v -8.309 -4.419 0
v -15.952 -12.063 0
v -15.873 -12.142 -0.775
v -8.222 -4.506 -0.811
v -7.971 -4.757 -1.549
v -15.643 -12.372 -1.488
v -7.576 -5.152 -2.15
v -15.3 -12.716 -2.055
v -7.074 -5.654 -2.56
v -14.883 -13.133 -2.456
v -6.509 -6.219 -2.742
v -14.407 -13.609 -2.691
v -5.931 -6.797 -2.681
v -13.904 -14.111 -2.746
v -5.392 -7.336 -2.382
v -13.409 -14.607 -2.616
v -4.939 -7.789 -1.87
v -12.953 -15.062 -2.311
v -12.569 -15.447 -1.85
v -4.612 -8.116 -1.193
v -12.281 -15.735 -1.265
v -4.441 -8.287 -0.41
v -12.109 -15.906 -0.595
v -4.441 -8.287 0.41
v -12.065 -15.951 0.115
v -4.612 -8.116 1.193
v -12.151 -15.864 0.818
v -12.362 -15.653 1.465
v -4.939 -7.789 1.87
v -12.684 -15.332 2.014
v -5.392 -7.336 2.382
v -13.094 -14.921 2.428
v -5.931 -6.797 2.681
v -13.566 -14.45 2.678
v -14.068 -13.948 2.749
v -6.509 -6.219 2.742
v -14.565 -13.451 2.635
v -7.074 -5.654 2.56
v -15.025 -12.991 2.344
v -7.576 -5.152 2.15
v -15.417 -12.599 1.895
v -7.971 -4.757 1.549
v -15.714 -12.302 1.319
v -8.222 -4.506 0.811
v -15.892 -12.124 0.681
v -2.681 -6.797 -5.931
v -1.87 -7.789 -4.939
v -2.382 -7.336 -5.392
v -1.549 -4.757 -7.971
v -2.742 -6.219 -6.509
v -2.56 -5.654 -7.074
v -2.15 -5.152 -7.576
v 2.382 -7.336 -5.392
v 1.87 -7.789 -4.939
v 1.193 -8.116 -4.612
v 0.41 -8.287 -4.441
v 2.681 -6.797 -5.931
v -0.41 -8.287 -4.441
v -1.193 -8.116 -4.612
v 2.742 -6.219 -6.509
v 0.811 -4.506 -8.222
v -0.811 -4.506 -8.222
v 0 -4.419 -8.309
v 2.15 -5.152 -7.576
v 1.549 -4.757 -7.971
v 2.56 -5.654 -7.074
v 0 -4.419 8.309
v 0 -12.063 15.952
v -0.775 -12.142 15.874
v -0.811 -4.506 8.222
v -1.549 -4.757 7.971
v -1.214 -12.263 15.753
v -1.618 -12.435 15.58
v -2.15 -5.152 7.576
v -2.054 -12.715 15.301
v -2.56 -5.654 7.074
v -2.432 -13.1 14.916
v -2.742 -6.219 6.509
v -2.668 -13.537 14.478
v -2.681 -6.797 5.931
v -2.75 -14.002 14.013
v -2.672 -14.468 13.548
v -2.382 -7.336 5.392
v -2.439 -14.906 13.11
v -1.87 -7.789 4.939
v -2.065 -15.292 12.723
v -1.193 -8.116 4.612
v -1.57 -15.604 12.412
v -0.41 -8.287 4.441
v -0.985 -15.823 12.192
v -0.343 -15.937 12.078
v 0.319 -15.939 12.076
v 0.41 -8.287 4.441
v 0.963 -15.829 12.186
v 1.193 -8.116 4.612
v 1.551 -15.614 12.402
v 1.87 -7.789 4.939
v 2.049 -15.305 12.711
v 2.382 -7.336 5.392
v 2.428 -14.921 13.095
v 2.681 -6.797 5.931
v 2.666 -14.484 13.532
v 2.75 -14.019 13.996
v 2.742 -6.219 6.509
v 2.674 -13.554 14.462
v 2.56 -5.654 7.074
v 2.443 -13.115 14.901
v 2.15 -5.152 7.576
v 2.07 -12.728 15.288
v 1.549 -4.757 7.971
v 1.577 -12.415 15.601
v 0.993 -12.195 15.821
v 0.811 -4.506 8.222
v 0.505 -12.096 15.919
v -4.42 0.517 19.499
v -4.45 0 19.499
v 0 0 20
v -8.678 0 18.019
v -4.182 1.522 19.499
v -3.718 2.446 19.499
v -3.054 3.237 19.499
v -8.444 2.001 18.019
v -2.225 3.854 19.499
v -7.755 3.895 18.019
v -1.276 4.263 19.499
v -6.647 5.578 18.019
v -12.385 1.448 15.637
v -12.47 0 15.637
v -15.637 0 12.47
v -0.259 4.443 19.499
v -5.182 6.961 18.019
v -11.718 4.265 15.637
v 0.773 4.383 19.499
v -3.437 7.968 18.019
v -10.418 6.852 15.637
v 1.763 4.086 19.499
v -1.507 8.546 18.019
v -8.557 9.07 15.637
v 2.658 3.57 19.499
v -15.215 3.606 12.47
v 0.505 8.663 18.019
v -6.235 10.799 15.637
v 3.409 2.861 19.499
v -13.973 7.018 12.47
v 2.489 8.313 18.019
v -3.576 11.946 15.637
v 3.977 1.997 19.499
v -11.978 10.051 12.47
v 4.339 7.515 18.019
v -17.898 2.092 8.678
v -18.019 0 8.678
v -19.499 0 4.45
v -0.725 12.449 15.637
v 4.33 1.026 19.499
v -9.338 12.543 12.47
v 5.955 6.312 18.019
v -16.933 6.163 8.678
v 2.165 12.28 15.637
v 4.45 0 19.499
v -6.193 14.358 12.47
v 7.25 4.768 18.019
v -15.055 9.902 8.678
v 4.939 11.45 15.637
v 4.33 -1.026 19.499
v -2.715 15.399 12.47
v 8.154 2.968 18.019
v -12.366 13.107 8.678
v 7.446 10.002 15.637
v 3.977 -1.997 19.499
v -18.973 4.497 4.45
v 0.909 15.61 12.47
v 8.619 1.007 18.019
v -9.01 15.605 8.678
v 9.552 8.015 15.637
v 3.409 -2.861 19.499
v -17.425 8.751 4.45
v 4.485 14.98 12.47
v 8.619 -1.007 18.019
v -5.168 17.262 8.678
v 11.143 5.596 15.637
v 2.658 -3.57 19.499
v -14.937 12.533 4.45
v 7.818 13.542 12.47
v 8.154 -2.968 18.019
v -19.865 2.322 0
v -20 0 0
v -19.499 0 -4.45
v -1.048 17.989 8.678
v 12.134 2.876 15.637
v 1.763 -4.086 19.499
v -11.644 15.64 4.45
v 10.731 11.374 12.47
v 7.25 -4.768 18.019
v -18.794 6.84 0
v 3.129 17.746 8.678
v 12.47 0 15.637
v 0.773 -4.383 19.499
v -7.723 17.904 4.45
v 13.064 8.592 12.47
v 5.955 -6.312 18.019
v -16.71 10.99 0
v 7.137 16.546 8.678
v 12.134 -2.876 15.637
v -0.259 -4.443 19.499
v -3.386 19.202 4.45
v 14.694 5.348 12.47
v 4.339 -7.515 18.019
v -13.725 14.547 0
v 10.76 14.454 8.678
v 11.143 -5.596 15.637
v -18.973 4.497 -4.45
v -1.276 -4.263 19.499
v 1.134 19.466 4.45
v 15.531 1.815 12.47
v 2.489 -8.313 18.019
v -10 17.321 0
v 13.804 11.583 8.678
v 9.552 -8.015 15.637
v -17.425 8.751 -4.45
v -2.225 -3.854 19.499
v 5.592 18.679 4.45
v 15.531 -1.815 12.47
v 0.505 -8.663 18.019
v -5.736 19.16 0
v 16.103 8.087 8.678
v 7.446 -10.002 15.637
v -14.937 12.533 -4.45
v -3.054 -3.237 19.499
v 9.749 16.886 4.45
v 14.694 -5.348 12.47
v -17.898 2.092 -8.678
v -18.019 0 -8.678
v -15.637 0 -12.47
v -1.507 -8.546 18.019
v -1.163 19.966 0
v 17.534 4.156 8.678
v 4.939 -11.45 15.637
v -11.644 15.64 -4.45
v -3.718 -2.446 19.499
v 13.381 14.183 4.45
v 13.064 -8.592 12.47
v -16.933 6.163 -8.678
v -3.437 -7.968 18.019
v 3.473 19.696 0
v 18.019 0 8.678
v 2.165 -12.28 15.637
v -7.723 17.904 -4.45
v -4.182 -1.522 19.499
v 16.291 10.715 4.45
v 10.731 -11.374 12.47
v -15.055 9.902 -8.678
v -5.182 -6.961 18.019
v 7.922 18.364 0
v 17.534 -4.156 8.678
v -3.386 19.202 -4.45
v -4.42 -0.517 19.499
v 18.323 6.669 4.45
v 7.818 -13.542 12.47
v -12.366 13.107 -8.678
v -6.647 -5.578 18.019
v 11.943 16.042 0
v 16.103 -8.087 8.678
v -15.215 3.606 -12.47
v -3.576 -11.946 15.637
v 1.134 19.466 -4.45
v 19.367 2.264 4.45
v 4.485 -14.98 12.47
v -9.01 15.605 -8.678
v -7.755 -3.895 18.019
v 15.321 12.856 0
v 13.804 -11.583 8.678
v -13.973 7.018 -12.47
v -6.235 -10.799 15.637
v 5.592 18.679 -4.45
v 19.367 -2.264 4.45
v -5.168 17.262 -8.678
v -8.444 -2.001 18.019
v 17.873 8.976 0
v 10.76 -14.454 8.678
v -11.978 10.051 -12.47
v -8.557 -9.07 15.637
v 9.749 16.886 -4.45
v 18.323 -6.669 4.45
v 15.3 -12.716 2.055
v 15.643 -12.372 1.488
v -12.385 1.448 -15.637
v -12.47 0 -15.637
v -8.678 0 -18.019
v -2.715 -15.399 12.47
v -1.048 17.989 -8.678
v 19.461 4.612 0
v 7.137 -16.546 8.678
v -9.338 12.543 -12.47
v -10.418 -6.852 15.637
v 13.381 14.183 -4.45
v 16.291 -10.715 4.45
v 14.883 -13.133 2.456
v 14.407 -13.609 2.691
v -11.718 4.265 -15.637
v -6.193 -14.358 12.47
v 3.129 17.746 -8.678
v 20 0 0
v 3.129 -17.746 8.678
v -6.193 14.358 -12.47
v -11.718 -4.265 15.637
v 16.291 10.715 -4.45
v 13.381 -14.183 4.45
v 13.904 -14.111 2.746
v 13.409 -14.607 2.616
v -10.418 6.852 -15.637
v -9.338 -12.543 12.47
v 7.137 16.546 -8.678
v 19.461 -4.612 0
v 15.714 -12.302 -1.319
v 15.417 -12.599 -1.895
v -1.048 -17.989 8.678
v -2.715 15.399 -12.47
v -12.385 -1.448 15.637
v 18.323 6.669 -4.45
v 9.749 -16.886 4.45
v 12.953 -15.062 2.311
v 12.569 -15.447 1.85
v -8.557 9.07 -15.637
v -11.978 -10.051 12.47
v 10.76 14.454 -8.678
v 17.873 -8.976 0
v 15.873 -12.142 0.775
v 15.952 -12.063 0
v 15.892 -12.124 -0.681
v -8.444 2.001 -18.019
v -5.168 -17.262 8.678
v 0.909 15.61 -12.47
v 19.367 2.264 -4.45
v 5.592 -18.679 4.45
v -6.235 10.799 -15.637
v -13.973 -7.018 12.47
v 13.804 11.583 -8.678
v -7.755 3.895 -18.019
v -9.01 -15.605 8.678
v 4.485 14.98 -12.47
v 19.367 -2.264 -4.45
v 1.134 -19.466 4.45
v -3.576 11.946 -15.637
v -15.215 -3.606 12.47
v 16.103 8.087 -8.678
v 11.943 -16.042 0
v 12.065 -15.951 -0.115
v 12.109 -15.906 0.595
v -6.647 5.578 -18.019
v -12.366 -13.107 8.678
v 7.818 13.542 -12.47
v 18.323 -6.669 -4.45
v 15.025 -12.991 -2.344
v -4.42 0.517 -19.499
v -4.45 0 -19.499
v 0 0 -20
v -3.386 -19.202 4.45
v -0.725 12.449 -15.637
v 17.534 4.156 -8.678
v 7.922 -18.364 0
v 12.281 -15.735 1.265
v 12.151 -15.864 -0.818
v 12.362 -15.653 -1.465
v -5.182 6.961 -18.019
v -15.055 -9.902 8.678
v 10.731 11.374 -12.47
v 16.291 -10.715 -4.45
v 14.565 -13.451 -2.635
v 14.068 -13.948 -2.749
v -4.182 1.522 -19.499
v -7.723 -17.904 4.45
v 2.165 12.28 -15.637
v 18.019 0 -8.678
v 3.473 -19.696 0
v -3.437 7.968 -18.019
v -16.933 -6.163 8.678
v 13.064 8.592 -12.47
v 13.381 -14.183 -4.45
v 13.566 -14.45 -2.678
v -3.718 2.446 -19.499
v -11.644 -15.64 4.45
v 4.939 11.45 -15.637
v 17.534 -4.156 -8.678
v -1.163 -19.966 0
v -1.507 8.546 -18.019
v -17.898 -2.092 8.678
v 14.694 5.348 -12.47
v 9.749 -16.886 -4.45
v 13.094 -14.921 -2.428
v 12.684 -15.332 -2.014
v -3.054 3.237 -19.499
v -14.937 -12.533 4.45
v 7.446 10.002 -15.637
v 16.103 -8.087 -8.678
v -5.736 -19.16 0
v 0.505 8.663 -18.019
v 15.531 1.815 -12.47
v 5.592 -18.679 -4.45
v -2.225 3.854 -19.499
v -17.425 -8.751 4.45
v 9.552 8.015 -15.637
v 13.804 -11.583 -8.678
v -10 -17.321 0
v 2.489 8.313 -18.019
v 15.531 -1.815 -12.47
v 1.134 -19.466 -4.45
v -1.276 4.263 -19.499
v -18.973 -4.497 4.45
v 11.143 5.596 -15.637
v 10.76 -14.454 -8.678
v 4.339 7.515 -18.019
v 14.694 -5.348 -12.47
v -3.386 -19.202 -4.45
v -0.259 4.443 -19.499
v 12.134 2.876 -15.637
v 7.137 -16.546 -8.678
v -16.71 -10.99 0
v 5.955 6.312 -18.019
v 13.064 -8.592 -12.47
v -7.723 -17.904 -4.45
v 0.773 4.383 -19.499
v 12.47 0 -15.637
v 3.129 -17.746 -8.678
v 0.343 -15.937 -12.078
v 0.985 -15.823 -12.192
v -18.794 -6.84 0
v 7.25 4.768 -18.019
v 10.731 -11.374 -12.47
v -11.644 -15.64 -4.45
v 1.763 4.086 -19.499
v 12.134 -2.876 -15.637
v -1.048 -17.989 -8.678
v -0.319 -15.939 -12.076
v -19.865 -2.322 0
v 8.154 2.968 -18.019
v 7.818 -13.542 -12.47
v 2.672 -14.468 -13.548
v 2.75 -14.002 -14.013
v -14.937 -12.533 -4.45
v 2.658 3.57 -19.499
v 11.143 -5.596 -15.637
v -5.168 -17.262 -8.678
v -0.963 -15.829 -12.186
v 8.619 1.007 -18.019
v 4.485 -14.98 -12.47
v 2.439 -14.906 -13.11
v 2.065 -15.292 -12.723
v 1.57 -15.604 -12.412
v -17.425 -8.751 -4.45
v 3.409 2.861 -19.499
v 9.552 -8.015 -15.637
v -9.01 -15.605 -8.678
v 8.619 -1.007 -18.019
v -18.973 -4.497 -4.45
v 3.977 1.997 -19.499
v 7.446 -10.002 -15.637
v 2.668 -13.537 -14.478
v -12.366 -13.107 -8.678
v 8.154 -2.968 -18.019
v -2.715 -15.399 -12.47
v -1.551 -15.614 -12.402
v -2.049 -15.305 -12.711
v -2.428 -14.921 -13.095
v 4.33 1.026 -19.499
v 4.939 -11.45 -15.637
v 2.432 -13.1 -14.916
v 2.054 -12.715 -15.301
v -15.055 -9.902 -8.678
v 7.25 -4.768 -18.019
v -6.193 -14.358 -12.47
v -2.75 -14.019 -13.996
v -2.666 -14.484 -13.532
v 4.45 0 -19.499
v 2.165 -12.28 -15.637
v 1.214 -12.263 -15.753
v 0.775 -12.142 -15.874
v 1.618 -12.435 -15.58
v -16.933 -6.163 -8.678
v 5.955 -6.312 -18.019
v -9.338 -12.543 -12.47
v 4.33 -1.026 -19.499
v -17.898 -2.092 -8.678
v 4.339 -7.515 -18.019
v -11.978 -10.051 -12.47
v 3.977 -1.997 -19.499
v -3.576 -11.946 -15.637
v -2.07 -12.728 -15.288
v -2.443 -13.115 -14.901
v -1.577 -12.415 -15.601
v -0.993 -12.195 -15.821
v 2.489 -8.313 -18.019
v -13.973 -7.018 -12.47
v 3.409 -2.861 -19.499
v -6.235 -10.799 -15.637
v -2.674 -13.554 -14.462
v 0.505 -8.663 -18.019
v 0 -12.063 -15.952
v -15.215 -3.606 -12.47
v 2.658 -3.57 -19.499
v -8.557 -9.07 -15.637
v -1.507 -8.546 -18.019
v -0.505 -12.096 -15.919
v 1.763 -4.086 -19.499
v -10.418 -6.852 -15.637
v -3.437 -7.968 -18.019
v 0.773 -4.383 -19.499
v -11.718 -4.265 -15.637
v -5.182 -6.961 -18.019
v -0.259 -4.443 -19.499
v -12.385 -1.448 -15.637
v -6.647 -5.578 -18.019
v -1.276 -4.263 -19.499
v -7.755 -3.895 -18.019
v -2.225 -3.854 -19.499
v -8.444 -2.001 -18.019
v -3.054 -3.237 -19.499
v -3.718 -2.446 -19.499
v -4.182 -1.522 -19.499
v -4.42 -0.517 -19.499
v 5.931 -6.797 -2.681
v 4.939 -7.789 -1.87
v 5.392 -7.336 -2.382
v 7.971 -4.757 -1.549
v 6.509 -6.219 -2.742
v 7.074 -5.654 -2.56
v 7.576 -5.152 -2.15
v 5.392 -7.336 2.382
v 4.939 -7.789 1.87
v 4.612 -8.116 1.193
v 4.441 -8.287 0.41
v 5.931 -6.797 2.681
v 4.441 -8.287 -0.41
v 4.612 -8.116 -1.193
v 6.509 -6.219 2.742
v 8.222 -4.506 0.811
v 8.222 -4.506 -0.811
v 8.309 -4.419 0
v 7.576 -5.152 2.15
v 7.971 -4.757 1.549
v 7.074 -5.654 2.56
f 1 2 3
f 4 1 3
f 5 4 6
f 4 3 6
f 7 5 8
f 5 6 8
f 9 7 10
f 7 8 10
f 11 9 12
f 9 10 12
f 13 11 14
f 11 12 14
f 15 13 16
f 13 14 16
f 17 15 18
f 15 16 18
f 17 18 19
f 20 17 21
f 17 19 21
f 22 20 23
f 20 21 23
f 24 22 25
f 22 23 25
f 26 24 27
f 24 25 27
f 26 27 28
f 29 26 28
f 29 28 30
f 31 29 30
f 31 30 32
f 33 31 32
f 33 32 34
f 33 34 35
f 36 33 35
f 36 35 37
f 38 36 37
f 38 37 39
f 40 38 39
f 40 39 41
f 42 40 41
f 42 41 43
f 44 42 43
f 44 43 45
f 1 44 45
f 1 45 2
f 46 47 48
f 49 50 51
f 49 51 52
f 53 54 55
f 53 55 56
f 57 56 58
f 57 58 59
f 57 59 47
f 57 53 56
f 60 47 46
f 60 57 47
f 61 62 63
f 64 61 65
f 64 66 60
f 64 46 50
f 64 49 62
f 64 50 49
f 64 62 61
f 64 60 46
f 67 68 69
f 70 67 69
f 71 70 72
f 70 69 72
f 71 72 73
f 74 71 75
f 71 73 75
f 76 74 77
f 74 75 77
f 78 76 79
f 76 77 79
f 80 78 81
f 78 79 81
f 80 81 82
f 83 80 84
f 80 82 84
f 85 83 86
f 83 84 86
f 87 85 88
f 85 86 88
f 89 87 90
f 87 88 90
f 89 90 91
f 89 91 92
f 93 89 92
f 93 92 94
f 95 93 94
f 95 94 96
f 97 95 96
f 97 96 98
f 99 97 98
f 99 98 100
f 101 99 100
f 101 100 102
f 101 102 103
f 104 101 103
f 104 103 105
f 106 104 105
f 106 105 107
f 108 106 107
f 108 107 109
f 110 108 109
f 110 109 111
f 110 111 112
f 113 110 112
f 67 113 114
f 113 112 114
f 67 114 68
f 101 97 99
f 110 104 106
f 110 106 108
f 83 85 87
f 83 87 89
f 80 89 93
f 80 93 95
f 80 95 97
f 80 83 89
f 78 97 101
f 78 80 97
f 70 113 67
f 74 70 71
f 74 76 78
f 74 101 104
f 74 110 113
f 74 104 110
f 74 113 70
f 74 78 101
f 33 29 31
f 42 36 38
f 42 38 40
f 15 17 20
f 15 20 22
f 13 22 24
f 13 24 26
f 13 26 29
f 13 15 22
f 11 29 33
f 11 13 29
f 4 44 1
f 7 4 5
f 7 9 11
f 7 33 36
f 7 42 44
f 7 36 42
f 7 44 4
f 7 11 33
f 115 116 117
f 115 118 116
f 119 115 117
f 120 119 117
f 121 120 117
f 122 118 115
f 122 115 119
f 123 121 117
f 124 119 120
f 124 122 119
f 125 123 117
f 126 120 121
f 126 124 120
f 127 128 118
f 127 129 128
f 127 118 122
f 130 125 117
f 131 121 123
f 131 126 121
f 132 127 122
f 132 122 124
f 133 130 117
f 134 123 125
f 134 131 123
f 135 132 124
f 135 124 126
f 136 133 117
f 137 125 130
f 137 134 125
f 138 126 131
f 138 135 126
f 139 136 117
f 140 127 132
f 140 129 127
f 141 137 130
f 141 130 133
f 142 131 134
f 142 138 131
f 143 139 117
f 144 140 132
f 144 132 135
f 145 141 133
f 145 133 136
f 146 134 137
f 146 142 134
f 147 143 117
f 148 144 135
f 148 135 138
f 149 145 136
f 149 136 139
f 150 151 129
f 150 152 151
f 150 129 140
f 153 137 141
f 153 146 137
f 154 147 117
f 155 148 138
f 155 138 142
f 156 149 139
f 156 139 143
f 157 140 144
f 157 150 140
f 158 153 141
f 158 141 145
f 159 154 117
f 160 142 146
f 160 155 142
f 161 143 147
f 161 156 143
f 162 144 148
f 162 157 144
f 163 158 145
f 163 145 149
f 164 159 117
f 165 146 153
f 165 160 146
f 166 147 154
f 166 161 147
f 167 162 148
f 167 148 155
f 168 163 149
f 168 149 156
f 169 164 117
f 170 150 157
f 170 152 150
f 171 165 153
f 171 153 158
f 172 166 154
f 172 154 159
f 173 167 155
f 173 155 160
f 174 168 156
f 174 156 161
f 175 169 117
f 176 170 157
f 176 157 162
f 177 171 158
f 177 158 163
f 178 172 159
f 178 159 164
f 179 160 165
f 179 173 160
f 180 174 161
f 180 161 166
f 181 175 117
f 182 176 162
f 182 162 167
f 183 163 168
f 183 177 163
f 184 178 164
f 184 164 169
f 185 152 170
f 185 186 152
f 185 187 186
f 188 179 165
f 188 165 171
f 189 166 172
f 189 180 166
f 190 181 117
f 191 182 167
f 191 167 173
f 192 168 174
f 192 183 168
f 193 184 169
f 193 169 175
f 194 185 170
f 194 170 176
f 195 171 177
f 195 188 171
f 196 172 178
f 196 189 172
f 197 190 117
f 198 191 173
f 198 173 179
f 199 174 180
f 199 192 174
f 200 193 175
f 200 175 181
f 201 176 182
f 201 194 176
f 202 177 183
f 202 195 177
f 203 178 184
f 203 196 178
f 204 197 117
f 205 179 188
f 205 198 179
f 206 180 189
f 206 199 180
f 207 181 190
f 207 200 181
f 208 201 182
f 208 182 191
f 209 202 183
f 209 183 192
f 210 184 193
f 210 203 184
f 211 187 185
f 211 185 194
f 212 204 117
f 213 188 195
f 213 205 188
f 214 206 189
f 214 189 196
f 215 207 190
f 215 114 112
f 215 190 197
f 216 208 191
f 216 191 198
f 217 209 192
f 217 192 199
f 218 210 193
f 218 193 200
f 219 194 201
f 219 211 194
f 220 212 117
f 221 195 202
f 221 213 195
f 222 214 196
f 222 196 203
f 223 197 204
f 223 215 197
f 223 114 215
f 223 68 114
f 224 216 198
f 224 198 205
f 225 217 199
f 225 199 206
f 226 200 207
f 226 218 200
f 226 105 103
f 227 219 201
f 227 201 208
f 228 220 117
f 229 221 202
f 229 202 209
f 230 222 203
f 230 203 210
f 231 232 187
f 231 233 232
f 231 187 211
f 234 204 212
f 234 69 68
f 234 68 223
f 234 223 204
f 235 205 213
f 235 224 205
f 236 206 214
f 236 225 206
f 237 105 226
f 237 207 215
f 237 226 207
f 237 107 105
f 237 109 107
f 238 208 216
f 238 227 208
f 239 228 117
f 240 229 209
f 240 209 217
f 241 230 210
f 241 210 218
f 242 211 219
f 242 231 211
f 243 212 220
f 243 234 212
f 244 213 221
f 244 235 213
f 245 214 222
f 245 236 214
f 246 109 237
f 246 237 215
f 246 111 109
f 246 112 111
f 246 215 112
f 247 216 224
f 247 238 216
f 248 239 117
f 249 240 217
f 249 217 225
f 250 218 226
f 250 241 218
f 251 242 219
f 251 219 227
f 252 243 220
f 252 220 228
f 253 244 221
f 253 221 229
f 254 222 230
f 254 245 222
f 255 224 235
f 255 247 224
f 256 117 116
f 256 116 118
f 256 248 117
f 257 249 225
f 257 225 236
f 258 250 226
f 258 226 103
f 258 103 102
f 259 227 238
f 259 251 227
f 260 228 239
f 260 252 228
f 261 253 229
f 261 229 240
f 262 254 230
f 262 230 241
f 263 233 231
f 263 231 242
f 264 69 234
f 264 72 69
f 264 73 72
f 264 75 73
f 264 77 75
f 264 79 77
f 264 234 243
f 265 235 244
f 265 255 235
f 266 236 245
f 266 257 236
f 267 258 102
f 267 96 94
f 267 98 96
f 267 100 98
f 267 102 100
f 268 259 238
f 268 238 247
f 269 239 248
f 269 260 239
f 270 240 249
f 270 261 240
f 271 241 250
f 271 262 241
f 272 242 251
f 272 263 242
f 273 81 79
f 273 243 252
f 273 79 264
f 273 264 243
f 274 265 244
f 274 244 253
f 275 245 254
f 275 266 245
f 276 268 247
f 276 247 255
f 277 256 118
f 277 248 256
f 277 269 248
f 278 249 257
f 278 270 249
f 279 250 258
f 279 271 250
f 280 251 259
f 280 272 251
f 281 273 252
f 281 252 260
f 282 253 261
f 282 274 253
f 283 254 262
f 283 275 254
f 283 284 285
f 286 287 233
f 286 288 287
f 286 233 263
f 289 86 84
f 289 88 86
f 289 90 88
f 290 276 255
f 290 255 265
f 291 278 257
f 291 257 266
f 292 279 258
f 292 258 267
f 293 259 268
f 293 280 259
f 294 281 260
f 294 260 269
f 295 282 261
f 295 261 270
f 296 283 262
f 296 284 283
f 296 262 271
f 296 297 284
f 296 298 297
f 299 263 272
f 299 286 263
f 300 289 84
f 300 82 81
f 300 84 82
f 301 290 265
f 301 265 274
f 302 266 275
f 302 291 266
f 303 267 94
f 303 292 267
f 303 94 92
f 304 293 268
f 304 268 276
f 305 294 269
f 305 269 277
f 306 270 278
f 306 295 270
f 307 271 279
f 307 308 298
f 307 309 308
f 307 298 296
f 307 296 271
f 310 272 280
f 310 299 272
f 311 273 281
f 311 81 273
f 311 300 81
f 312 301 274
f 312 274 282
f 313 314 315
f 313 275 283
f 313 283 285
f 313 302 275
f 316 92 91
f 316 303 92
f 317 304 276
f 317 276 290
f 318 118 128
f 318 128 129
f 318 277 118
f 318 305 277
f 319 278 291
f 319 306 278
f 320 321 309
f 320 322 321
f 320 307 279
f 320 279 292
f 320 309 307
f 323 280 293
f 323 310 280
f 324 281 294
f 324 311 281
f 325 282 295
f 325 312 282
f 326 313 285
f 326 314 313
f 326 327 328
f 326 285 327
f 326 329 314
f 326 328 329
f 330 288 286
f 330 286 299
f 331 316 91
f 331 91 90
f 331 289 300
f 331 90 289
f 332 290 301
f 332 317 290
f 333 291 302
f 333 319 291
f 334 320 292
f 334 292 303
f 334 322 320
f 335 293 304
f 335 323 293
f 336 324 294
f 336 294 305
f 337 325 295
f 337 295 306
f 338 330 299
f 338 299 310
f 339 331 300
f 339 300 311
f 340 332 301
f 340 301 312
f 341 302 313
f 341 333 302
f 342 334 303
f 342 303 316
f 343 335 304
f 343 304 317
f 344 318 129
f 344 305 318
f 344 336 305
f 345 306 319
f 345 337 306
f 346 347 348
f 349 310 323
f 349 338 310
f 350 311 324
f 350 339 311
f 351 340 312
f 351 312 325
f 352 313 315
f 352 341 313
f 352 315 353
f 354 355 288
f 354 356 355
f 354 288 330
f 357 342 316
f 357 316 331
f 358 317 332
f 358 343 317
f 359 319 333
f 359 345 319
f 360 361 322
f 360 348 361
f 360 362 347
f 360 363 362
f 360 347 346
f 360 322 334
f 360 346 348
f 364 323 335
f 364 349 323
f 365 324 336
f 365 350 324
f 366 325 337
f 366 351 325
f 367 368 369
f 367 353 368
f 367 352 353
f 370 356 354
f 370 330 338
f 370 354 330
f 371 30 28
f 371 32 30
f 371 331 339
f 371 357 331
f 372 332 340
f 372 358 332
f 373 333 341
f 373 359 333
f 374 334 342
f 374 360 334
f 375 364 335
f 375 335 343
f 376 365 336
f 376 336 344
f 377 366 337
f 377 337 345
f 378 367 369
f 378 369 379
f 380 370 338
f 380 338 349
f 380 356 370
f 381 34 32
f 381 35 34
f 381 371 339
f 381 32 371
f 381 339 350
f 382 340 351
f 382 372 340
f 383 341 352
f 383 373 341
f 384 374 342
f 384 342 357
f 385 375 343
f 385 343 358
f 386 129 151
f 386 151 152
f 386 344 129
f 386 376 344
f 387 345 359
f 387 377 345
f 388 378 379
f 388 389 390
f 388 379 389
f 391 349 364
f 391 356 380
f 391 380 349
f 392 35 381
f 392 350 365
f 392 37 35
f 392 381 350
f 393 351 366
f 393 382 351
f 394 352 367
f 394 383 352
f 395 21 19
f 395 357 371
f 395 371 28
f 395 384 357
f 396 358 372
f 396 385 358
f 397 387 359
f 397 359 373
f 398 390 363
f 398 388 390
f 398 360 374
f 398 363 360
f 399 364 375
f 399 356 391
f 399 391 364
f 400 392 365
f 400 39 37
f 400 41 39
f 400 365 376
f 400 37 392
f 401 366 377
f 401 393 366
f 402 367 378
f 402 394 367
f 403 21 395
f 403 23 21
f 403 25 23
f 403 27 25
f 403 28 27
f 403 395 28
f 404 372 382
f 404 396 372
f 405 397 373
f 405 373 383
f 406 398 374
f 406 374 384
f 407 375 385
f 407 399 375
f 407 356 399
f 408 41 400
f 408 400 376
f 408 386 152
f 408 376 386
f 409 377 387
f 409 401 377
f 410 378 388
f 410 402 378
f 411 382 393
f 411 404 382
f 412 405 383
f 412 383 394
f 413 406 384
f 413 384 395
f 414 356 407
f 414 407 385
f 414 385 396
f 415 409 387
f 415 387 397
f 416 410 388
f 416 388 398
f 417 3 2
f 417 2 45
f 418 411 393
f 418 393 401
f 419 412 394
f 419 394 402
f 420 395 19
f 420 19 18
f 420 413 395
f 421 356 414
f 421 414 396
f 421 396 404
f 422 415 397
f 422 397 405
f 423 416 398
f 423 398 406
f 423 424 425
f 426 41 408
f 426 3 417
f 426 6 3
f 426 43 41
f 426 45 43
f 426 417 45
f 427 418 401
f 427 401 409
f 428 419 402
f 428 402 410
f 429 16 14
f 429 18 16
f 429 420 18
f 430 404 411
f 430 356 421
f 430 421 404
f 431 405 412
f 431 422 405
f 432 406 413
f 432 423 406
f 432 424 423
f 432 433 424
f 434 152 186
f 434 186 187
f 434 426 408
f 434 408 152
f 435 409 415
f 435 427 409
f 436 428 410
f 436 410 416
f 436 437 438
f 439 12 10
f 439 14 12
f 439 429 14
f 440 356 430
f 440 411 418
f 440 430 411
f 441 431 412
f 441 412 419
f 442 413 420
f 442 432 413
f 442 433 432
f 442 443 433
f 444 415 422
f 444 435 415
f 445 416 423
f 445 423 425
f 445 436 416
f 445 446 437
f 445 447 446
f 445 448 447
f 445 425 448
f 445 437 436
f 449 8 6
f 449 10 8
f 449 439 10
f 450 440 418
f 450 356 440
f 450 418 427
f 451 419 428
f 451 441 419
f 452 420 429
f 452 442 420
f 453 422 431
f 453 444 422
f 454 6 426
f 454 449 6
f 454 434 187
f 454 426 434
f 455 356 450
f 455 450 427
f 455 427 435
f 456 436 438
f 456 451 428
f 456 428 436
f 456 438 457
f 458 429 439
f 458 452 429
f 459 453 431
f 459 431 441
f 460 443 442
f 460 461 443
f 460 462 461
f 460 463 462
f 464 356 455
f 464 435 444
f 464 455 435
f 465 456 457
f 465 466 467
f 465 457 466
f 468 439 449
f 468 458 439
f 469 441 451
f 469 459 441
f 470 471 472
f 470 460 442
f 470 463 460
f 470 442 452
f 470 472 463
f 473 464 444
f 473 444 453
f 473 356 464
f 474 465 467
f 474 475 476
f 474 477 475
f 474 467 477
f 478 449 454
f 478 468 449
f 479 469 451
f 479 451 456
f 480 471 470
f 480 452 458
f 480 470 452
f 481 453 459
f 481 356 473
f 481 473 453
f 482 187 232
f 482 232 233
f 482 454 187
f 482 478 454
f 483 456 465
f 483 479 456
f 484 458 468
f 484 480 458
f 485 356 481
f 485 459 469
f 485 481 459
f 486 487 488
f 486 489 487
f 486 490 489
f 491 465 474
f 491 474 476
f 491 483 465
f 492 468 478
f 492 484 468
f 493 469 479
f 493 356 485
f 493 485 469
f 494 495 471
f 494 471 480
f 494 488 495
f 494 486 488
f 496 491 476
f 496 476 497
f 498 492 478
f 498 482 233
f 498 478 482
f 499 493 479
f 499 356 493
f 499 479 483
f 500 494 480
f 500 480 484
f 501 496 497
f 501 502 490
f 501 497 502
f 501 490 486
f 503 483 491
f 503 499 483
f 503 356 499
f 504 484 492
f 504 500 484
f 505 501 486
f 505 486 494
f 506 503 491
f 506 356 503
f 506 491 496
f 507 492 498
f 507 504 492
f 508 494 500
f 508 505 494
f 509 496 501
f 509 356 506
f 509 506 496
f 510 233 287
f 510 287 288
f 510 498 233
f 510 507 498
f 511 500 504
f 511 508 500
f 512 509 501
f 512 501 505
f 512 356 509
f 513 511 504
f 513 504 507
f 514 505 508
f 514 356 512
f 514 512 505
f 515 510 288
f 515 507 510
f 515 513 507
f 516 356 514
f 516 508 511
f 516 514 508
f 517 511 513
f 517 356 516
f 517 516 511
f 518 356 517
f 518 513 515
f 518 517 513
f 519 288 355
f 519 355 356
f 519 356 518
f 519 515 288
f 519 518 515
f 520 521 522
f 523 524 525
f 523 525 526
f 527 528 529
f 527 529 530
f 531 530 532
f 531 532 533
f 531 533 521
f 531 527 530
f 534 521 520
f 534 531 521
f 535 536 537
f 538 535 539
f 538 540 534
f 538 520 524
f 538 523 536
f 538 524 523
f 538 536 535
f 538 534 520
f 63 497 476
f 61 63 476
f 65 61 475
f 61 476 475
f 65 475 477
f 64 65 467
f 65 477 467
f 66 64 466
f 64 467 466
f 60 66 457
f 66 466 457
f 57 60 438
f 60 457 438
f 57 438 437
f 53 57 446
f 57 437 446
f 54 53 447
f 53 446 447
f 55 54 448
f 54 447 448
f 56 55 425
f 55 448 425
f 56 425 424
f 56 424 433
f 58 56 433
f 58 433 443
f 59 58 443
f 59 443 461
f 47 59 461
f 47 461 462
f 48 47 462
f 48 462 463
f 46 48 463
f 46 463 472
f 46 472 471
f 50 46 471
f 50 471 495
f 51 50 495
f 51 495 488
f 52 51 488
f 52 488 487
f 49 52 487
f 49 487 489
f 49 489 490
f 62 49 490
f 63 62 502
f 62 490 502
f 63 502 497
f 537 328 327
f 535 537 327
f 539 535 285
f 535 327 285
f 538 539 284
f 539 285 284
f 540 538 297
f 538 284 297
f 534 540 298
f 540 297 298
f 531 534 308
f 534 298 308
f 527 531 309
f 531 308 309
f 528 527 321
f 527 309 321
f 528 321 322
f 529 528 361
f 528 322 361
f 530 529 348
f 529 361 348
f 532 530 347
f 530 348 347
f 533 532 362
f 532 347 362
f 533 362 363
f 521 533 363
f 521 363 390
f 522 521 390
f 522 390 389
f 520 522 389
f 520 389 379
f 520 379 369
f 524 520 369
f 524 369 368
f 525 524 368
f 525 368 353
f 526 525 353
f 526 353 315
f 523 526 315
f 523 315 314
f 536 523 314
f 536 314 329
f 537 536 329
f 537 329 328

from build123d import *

# Parameters (mm, degrees)
F5_R            = 2.75
F6_DEPTH        = 11
F6_COPIES_COUNT = 4


# Not quite as in the source:
# - a pattern or mirror of a feature is missing from the dataset's text; its kind, count and spacing are read off the source's solid


with BuildPart() as f2:
    # F1 (on Front) → F2 (revolve)
    with BuildSketch(Plane.XZ):
        with BuildLine():
            ThreePointArc((0, 20), (-20, 0), (0, -20))
            Line((0, -20), (0, 20))
        make_face()
    revolve(axis=Axis((0, 0, 0), (0, 0, -1)))

    # F5 (on line) → F6 (cut)
    with BuildSketch(Plane(origin=(14.1421356237, -14.1421356237, 0), x_dir=(0.7071067812, 0.7071067812, 0), z_dir=(0.7071067812, -0.7071067812, 0))):
        Circle(F5_R)
    f6 = extrude(amount=-F6_DEPTH, mode=Mode.SUBTRACT)

    # F6_copies: F6 ×4 about axis
    f6_copies_axis = Axis((0, 0, 0), (0, 1, 0))
    for i in range(1, F6_COPIES_COUNT):
        add(f6.rotate(f6_copies_axis, i * 360 / F6_COPIES_COUNT), mode=Mode.SUBTRACT)


solid = f2.part
